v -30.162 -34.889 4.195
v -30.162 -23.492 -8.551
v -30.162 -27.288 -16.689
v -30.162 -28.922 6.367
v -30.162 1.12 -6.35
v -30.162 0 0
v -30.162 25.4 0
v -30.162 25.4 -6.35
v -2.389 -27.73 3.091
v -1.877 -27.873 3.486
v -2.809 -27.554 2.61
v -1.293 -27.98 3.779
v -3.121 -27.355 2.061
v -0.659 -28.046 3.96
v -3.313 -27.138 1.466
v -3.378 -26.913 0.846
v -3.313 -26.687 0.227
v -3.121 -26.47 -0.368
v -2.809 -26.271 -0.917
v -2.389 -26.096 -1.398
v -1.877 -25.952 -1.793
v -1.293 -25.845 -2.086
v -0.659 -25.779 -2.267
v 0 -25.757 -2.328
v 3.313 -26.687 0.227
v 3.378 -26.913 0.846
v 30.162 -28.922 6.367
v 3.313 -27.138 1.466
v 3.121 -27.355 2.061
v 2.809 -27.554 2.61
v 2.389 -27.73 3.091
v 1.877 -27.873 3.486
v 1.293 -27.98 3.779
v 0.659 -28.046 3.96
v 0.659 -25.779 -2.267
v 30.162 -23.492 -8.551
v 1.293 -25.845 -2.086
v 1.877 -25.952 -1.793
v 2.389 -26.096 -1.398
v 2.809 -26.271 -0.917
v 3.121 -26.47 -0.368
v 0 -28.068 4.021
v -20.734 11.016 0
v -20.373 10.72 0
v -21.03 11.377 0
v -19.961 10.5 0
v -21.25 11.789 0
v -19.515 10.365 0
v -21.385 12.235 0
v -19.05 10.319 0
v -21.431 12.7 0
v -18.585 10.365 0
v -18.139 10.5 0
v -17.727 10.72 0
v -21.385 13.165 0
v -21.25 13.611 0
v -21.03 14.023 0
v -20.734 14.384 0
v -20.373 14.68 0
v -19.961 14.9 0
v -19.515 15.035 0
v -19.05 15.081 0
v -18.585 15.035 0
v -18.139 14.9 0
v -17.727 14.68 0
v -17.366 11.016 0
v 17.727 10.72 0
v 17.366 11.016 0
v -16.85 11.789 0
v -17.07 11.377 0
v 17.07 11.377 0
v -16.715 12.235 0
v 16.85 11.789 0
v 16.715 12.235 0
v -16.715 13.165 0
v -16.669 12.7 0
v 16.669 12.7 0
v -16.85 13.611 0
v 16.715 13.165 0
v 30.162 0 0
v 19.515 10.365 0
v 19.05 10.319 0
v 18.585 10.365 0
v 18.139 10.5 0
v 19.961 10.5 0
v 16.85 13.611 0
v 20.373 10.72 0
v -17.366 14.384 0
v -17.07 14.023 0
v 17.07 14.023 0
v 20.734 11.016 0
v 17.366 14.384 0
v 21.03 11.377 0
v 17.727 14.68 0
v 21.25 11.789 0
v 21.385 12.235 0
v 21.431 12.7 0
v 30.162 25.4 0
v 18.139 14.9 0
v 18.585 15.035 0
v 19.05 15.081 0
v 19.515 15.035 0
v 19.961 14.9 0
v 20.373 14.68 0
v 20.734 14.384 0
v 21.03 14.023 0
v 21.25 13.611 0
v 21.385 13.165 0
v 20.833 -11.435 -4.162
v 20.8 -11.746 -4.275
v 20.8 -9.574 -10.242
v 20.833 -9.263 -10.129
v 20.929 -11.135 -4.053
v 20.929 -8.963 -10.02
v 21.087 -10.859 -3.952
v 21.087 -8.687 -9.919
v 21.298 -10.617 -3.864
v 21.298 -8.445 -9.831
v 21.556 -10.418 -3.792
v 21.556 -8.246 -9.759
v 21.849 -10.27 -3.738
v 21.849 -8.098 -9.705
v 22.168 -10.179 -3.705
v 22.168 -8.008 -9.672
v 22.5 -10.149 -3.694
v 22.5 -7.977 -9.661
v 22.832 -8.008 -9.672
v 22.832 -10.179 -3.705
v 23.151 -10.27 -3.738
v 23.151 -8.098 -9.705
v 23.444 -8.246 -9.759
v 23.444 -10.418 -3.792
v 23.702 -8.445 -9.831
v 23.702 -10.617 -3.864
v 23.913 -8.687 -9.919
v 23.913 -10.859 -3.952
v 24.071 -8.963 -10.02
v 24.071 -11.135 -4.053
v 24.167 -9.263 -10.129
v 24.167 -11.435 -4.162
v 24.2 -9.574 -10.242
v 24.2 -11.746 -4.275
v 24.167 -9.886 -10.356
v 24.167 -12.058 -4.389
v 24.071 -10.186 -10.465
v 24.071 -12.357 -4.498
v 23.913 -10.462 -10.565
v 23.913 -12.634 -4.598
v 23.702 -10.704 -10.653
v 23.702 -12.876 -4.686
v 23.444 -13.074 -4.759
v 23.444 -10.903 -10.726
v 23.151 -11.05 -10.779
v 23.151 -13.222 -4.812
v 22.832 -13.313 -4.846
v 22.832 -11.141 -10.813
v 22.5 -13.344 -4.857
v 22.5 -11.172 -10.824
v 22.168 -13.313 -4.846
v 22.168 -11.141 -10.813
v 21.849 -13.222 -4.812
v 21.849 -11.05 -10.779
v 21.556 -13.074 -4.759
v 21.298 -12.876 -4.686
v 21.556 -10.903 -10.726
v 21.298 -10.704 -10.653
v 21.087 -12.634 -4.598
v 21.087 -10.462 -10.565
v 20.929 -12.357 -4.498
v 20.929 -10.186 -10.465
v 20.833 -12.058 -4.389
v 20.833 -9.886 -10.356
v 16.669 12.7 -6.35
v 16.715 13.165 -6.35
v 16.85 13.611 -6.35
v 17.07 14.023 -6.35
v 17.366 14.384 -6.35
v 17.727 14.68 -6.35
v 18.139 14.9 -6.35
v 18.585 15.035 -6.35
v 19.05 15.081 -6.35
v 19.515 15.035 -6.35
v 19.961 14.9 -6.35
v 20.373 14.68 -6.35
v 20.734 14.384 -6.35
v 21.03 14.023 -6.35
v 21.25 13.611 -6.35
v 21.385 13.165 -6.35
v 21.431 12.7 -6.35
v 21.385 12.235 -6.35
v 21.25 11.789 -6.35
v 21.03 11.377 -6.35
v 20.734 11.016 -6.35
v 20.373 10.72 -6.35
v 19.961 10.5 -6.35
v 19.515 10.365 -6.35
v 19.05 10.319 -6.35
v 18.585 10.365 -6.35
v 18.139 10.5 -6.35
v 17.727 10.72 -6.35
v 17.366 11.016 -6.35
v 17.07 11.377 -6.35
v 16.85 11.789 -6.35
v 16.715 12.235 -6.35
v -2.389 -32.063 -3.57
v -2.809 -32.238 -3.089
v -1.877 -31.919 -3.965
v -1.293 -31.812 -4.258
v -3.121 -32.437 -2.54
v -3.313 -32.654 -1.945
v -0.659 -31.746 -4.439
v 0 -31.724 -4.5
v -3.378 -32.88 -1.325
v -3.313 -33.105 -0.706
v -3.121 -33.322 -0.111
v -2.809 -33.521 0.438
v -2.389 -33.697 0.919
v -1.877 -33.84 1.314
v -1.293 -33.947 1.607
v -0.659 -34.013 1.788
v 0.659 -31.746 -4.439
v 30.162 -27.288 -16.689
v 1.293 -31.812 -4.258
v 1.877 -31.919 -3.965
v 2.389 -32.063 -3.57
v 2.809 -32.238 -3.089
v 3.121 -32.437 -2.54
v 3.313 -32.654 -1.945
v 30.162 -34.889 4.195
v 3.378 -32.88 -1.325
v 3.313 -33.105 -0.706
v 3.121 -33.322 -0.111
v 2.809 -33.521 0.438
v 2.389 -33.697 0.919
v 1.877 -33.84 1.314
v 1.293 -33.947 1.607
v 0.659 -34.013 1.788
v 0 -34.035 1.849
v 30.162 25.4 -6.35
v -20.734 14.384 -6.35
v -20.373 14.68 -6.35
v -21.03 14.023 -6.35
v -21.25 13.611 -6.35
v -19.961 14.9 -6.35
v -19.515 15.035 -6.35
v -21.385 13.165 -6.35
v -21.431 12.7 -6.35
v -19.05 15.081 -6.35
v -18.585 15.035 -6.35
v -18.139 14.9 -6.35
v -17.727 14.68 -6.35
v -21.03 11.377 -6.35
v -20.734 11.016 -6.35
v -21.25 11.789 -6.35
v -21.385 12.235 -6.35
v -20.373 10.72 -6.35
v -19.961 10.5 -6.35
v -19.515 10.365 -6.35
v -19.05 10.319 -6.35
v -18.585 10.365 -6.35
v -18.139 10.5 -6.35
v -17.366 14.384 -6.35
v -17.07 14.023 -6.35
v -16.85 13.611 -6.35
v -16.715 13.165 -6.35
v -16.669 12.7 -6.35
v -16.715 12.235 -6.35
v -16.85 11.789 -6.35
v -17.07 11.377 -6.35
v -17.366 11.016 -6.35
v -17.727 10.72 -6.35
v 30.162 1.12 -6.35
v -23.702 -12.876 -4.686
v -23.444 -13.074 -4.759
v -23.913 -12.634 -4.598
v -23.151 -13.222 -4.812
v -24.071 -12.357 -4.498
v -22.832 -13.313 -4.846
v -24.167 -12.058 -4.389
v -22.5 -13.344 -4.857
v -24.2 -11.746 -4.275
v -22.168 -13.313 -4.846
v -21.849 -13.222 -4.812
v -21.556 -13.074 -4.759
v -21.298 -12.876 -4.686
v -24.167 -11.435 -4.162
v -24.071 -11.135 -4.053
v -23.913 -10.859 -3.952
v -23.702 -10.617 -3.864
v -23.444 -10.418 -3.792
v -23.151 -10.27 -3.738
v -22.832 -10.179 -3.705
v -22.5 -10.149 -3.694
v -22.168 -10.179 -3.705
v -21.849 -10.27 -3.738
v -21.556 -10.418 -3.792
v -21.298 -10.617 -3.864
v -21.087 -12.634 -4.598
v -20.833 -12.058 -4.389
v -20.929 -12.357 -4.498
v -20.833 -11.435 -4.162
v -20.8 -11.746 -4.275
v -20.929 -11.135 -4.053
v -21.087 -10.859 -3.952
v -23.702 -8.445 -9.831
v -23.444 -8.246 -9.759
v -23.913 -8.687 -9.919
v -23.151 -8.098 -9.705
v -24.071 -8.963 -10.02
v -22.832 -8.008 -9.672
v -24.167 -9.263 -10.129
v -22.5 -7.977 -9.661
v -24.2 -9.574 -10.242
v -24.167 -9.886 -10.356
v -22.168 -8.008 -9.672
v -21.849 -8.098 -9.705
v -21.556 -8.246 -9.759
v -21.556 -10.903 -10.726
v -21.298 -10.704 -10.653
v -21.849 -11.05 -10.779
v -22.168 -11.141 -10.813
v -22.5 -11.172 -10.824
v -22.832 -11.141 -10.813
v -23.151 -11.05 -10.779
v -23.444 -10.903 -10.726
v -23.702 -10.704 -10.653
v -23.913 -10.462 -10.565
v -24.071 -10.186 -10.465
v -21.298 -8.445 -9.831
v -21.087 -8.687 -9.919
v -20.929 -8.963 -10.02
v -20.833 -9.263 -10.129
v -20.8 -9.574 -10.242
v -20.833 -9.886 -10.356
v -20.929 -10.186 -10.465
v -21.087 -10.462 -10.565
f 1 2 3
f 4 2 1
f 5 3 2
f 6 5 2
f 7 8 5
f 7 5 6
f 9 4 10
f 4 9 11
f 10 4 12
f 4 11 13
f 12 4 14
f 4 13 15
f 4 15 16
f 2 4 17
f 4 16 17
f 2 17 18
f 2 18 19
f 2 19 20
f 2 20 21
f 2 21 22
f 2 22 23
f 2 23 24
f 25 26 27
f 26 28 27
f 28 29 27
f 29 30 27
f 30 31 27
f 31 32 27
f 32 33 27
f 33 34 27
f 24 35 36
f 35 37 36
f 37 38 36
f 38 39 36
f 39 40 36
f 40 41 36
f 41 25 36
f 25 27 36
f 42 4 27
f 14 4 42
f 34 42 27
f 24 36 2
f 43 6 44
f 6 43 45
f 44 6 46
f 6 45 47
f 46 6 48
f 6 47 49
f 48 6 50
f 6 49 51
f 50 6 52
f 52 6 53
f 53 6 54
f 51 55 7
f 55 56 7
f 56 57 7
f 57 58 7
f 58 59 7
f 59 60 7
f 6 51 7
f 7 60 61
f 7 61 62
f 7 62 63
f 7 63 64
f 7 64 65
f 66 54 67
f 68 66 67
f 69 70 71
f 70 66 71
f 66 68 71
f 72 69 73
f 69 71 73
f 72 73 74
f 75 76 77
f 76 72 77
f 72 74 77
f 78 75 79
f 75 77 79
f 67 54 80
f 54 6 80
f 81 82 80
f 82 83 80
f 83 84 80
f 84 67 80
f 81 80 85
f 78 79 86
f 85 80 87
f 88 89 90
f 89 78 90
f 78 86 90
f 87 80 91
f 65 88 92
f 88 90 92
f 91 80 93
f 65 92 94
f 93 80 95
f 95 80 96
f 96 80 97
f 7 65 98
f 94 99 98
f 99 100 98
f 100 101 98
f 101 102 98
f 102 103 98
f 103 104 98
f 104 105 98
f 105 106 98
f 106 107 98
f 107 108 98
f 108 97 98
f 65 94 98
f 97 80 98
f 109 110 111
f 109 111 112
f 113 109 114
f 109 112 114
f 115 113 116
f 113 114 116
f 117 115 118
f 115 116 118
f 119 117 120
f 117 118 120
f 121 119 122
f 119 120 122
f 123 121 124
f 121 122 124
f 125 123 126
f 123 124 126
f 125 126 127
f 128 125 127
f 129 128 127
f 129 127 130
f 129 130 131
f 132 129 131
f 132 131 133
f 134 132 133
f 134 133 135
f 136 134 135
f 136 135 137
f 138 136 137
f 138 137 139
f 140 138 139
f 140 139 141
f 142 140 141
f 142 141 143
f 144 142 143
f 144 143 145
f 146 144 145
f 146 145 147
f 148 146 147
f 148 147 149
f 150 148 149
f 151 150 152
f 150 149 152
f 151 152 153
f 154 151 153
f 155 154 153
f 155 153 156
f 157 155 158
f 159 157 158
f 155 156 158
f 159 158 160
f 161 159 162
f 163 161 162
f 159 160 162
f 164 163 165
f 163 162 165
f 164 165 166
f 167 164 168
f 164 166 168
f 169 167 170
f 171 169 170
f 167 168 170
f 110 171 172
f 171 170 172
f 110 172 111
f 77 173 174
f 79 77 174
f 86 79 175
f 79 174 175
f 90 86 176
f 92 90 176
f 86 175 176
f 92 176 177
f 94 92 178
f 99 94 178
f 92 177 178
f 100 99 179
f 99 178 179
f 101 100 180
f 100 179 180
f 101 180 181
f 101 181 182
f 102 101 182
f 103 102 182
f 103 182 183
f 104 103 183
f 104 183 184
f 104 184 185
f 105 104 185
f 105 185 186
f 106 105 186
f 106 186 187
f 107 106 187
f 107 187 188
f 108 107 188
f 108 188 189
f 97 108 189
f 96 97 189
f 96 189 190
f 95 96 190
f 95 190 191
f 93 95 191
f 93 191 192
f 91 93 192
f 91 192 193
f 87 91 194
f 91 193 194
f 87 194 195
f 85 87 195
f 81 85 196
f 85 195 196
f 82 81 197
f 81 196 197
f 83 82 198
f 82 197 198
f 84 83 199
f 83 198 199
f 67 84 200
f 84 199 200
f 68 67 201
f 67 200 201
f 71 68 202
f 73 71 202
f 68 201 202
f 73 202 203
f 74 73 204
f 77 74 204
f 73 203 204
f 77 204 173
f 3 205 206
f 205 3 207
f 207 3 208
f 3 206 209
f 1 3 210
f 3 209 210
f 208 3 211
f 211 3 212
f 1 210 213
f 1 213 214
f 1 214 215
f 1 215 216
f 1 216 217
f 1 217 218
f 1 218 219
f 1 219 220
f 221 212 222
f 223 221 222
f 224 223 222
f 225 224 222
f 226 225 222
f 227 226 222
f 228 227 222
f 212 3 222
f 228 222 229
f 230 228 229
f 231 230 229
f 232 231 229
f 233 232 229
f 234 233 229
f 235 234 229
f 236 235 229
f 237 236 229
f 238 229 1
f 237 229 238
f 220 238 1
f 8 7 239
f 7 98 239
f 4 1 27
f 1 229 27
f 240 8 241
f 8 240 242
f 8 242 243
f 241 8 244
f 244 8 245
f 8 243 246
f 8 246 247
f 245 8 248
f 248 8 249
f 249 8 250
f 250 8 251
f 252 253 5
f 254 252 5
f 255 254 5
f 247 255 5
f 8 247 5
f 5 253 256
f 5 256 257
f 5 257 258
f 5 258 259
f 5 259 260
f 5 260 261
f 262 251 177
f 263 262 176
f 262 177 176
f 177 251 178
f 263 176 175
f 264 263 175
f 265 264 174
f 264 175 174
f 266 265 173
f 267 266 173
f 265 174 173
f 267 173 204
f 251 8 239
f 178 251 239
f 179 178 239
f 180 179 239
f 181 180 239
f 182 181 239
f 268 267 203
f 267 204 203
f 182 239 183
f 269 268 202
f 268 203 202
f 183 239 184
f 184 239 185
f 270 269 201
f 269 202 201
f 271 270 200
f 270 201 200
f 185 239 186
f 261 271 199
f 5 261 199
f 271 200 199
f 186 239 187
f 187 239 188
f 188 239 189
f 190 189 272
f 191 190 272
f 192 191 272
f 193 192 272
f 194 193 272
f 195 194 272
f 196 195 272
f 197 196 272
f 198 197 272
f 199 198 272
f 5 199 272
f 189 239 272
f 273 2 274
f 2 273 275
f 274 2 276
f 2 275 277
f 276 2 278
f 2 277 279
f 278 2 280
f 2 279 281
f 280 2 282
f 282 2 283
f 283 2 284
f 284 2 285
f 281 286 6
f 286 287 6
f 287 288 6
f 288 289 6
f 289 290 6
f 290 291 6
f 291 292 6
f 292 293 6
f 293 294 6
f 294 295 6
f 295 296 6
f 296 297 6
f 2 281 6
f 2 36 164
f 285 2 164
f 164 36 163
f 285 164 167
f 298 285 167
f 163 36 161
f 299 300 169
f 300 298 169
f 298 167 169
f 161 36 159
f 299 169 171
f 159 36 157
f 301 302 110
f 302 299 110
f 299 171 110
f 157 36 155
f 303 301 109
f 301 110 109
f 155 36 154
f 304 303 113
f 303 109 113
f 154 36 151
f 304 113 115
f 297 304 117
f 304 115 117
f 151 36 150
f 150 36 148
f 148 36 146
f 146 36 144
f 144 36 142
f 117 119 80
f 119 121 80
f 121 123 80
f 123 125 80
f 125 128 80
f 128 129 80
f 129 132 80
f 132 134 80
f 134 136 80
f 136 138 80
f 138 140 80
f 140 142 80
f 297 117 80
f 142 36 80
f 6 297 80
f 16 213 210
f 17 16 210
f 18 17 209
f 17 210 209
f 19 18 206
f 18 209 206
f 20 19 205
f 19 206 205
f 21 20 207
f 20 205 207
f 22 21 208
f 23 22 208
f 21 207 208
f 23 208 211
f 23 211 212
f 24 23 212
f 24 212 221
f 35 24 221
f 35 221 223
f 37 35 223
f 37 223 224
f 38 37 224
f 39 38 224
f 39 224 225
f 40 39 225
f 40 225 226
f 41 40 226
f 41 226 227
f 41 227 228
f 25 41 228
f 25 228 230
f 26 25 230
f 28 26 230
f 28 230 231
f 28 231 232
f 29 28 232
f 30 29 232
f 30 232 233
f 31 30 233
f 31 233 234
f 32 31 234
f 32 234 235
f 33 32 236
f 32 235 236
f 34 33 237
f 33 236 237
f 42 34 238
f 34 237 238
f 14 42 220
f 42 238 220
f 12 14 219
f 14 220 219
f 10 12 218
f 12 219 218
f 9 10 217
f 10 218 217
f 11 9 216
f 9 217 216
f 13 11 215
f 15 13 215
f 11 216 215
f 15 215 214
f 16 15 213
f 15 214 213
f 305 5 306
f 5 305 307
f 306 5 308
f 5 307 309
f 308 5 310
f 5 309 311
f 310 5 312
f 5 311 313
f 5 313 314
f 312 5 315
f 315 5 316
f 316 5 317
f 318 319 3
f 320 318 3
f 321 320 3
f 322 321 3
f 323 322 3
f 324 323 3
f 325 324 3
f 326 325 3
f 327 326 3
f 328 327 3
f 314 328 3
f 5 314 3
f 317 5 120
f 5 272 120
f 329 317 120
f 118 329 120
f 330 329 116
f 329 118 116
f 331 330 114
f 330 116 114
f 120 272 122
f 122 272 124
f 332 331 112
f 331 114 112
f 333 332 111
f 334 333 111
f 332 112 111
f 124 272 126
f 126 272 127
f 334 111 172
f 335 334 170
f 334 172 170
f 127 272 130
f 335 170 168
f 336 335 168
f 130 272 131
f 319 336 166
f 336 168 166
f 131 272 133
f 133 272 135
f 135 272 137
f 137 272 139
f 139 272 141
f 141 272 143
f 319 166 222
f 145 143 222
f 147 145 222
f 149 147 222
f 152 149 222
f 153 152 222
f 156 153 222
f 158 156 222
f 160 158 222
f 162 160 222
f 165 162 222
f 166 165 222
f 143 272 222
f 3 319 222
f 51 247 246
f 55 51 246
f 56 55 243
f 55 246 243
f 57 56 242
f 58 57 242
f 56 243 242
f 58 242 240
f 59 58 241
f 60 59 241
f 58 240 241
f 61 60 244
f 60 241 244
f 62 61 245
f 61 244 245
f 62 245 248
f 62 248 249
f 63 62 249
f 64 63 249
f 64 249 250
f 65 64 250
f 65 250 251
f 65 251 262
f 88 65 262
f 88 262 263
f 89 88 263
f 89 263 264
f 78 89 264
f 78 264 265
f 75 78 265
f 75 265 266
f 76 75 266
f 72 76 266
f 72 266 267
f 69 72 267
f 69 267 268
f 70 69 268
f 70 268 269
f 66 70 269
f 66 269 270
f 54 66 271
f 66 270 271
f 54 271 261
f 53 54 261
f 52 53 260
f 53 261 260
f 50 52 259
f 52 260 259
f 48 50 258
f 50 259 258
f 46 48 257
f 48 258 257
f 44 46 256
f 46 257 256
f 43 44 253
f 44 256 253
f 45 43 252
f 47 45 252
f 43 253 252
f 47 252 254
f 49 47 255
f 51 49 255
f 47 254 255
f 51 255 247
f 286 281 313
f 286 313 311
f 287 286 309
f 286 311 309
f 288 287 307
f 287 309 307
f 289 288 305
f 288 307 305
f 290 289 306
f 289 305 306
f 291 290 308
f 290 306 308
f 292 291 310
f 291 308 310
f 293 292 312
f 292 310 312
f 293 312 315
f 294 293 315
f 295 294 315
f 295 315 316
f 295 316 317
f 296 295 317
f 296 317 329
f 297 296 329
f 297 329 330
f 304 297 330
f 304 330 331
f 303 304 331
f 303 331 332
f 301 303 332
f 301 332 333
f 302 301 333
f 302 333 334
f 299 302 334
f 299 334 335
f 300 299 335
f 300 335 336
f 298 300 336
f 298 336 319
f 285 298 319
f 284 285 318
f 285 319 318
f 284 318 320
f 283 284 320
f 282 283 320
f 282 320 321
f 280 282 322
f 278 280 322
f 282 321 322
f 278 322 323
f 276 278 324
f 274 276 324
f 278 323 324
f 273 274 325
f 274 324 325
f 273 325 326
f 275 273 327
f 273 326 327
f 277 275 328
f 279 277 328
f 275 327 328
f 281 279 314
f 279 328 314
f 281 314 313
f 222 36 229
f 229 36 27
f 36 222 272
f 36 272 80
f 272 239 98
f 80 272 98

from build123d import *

# Parameters (mm, degrees)
BOSS_EXTRUDE1_DEPTH            = 30.1625
F_1_4_CLEARANCE_HOLE1_D        = 6.7564
M3_CLEARANCE_HOLE1_D           = 3.4
F_3_16_0_1875_DIAMETER_HOLE2_D = 4.7625


with BuildPart() as part:
    # Sketch2 → Boss-Extrude1 (new, symmetric)
    with BuildSketch(Plane(origin=(0, 0, 0), x_dir=(0, 0, -1), z_dir=(1, 0, 0))):
        Polygon((0, 0), (0, 25.4), (6.35, 25.4), (6.35, 1.119676327), (16.689379635, -27.287535752), (-4.195288862, -34.888933437), (-6.367116772, -28.921885295), (8.550503583, -23.49231552), align=None)
    extrude(amount=BOSS_EXTRUDE1_DEPTH, both=True)

    # 1/4 Clearance Hole1 (through all)
    with Locations(Plane(origin=(0, -23.49231552, -8.550503583), x_dir=(1, 0, 0), z_dir=(0, 0.9396926207859081, 0.3420201433256697))):
        with Locations((0, -10)):
            Hole(F_1_4_CLEARANCE_HOLE1_D / 2)

    # M3 Clearance Hole1 (through all)
    with Locations(Plane(origin=(0, 0, 0), x_dir=(1, 0, 0), z_dir=(0, -0.3420201433256693, 0.9396926207859083))):
        with Locations((-22.5, -12.5), (22.5, -12.5)):
            Hole(M3_CLEARANCE_HOLE1_D / 2)

    # 3/16 (0.1875) Diameter Hole2 (through all)
    with Locations(Plane.XY):
        with Locations((-19.05, 12.7), (19.05, 12.7)):
            Hole(F_3_16_0_1875_DIAMETER_HOLE2_D / 2)


solid = part.part
